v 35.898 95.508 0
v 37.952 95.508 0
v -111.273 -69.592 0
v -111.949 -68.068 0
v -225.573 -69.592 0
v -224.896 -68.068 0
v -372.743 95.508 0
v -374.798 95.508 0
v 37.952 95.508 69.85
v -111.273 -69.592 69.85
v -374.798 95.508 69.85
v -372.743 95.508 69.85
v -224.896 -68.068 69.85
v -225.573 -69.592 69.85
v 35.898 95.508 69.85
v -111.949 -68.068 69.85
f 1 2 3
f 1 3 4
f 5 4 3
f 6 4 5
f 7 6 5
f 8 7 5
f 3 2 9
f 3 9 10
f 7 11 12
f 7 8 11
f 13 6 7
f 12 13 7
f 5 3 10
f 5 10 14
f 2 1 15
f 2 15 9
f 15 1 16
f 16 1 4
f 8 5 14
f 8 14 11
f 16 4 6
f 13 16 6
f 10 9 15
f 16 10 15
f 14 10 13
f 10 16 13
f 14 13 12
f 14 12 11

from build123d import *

# Parameters (mm, degrees)
BOSS_EXTRUDE1_DEPTH = 69.85
SHELL10_T           = -1.524


with BuildPart() as part:
    # Sketch1 → Boss-Extrude1 (new body)
    with BuildSketch(Plane.XY):
        Polygon((-374.797674419, 95.508430233), (37.952325581, 95.508430233), (-111.272674419, -69.591569767), (-225.572674419, -69.591569767), align=None)
    extrude(amount=BOSS_EXTRUDE1_DEPTH)

    # Shell10
    shell10_openings = [part.faces().sort_by_distance(p)[0] for p in [
        (-168.422674419, 12.958430233, 69.85),
        (-168.422674419, 12.958430233, 0),
        (-168.422674419, 95.508430233, 34.925),
    ]]
    offset(amount=SHELL10_T, openings=shell10_openings, kind=Kind.INTERSECTION)


solid = part.part
